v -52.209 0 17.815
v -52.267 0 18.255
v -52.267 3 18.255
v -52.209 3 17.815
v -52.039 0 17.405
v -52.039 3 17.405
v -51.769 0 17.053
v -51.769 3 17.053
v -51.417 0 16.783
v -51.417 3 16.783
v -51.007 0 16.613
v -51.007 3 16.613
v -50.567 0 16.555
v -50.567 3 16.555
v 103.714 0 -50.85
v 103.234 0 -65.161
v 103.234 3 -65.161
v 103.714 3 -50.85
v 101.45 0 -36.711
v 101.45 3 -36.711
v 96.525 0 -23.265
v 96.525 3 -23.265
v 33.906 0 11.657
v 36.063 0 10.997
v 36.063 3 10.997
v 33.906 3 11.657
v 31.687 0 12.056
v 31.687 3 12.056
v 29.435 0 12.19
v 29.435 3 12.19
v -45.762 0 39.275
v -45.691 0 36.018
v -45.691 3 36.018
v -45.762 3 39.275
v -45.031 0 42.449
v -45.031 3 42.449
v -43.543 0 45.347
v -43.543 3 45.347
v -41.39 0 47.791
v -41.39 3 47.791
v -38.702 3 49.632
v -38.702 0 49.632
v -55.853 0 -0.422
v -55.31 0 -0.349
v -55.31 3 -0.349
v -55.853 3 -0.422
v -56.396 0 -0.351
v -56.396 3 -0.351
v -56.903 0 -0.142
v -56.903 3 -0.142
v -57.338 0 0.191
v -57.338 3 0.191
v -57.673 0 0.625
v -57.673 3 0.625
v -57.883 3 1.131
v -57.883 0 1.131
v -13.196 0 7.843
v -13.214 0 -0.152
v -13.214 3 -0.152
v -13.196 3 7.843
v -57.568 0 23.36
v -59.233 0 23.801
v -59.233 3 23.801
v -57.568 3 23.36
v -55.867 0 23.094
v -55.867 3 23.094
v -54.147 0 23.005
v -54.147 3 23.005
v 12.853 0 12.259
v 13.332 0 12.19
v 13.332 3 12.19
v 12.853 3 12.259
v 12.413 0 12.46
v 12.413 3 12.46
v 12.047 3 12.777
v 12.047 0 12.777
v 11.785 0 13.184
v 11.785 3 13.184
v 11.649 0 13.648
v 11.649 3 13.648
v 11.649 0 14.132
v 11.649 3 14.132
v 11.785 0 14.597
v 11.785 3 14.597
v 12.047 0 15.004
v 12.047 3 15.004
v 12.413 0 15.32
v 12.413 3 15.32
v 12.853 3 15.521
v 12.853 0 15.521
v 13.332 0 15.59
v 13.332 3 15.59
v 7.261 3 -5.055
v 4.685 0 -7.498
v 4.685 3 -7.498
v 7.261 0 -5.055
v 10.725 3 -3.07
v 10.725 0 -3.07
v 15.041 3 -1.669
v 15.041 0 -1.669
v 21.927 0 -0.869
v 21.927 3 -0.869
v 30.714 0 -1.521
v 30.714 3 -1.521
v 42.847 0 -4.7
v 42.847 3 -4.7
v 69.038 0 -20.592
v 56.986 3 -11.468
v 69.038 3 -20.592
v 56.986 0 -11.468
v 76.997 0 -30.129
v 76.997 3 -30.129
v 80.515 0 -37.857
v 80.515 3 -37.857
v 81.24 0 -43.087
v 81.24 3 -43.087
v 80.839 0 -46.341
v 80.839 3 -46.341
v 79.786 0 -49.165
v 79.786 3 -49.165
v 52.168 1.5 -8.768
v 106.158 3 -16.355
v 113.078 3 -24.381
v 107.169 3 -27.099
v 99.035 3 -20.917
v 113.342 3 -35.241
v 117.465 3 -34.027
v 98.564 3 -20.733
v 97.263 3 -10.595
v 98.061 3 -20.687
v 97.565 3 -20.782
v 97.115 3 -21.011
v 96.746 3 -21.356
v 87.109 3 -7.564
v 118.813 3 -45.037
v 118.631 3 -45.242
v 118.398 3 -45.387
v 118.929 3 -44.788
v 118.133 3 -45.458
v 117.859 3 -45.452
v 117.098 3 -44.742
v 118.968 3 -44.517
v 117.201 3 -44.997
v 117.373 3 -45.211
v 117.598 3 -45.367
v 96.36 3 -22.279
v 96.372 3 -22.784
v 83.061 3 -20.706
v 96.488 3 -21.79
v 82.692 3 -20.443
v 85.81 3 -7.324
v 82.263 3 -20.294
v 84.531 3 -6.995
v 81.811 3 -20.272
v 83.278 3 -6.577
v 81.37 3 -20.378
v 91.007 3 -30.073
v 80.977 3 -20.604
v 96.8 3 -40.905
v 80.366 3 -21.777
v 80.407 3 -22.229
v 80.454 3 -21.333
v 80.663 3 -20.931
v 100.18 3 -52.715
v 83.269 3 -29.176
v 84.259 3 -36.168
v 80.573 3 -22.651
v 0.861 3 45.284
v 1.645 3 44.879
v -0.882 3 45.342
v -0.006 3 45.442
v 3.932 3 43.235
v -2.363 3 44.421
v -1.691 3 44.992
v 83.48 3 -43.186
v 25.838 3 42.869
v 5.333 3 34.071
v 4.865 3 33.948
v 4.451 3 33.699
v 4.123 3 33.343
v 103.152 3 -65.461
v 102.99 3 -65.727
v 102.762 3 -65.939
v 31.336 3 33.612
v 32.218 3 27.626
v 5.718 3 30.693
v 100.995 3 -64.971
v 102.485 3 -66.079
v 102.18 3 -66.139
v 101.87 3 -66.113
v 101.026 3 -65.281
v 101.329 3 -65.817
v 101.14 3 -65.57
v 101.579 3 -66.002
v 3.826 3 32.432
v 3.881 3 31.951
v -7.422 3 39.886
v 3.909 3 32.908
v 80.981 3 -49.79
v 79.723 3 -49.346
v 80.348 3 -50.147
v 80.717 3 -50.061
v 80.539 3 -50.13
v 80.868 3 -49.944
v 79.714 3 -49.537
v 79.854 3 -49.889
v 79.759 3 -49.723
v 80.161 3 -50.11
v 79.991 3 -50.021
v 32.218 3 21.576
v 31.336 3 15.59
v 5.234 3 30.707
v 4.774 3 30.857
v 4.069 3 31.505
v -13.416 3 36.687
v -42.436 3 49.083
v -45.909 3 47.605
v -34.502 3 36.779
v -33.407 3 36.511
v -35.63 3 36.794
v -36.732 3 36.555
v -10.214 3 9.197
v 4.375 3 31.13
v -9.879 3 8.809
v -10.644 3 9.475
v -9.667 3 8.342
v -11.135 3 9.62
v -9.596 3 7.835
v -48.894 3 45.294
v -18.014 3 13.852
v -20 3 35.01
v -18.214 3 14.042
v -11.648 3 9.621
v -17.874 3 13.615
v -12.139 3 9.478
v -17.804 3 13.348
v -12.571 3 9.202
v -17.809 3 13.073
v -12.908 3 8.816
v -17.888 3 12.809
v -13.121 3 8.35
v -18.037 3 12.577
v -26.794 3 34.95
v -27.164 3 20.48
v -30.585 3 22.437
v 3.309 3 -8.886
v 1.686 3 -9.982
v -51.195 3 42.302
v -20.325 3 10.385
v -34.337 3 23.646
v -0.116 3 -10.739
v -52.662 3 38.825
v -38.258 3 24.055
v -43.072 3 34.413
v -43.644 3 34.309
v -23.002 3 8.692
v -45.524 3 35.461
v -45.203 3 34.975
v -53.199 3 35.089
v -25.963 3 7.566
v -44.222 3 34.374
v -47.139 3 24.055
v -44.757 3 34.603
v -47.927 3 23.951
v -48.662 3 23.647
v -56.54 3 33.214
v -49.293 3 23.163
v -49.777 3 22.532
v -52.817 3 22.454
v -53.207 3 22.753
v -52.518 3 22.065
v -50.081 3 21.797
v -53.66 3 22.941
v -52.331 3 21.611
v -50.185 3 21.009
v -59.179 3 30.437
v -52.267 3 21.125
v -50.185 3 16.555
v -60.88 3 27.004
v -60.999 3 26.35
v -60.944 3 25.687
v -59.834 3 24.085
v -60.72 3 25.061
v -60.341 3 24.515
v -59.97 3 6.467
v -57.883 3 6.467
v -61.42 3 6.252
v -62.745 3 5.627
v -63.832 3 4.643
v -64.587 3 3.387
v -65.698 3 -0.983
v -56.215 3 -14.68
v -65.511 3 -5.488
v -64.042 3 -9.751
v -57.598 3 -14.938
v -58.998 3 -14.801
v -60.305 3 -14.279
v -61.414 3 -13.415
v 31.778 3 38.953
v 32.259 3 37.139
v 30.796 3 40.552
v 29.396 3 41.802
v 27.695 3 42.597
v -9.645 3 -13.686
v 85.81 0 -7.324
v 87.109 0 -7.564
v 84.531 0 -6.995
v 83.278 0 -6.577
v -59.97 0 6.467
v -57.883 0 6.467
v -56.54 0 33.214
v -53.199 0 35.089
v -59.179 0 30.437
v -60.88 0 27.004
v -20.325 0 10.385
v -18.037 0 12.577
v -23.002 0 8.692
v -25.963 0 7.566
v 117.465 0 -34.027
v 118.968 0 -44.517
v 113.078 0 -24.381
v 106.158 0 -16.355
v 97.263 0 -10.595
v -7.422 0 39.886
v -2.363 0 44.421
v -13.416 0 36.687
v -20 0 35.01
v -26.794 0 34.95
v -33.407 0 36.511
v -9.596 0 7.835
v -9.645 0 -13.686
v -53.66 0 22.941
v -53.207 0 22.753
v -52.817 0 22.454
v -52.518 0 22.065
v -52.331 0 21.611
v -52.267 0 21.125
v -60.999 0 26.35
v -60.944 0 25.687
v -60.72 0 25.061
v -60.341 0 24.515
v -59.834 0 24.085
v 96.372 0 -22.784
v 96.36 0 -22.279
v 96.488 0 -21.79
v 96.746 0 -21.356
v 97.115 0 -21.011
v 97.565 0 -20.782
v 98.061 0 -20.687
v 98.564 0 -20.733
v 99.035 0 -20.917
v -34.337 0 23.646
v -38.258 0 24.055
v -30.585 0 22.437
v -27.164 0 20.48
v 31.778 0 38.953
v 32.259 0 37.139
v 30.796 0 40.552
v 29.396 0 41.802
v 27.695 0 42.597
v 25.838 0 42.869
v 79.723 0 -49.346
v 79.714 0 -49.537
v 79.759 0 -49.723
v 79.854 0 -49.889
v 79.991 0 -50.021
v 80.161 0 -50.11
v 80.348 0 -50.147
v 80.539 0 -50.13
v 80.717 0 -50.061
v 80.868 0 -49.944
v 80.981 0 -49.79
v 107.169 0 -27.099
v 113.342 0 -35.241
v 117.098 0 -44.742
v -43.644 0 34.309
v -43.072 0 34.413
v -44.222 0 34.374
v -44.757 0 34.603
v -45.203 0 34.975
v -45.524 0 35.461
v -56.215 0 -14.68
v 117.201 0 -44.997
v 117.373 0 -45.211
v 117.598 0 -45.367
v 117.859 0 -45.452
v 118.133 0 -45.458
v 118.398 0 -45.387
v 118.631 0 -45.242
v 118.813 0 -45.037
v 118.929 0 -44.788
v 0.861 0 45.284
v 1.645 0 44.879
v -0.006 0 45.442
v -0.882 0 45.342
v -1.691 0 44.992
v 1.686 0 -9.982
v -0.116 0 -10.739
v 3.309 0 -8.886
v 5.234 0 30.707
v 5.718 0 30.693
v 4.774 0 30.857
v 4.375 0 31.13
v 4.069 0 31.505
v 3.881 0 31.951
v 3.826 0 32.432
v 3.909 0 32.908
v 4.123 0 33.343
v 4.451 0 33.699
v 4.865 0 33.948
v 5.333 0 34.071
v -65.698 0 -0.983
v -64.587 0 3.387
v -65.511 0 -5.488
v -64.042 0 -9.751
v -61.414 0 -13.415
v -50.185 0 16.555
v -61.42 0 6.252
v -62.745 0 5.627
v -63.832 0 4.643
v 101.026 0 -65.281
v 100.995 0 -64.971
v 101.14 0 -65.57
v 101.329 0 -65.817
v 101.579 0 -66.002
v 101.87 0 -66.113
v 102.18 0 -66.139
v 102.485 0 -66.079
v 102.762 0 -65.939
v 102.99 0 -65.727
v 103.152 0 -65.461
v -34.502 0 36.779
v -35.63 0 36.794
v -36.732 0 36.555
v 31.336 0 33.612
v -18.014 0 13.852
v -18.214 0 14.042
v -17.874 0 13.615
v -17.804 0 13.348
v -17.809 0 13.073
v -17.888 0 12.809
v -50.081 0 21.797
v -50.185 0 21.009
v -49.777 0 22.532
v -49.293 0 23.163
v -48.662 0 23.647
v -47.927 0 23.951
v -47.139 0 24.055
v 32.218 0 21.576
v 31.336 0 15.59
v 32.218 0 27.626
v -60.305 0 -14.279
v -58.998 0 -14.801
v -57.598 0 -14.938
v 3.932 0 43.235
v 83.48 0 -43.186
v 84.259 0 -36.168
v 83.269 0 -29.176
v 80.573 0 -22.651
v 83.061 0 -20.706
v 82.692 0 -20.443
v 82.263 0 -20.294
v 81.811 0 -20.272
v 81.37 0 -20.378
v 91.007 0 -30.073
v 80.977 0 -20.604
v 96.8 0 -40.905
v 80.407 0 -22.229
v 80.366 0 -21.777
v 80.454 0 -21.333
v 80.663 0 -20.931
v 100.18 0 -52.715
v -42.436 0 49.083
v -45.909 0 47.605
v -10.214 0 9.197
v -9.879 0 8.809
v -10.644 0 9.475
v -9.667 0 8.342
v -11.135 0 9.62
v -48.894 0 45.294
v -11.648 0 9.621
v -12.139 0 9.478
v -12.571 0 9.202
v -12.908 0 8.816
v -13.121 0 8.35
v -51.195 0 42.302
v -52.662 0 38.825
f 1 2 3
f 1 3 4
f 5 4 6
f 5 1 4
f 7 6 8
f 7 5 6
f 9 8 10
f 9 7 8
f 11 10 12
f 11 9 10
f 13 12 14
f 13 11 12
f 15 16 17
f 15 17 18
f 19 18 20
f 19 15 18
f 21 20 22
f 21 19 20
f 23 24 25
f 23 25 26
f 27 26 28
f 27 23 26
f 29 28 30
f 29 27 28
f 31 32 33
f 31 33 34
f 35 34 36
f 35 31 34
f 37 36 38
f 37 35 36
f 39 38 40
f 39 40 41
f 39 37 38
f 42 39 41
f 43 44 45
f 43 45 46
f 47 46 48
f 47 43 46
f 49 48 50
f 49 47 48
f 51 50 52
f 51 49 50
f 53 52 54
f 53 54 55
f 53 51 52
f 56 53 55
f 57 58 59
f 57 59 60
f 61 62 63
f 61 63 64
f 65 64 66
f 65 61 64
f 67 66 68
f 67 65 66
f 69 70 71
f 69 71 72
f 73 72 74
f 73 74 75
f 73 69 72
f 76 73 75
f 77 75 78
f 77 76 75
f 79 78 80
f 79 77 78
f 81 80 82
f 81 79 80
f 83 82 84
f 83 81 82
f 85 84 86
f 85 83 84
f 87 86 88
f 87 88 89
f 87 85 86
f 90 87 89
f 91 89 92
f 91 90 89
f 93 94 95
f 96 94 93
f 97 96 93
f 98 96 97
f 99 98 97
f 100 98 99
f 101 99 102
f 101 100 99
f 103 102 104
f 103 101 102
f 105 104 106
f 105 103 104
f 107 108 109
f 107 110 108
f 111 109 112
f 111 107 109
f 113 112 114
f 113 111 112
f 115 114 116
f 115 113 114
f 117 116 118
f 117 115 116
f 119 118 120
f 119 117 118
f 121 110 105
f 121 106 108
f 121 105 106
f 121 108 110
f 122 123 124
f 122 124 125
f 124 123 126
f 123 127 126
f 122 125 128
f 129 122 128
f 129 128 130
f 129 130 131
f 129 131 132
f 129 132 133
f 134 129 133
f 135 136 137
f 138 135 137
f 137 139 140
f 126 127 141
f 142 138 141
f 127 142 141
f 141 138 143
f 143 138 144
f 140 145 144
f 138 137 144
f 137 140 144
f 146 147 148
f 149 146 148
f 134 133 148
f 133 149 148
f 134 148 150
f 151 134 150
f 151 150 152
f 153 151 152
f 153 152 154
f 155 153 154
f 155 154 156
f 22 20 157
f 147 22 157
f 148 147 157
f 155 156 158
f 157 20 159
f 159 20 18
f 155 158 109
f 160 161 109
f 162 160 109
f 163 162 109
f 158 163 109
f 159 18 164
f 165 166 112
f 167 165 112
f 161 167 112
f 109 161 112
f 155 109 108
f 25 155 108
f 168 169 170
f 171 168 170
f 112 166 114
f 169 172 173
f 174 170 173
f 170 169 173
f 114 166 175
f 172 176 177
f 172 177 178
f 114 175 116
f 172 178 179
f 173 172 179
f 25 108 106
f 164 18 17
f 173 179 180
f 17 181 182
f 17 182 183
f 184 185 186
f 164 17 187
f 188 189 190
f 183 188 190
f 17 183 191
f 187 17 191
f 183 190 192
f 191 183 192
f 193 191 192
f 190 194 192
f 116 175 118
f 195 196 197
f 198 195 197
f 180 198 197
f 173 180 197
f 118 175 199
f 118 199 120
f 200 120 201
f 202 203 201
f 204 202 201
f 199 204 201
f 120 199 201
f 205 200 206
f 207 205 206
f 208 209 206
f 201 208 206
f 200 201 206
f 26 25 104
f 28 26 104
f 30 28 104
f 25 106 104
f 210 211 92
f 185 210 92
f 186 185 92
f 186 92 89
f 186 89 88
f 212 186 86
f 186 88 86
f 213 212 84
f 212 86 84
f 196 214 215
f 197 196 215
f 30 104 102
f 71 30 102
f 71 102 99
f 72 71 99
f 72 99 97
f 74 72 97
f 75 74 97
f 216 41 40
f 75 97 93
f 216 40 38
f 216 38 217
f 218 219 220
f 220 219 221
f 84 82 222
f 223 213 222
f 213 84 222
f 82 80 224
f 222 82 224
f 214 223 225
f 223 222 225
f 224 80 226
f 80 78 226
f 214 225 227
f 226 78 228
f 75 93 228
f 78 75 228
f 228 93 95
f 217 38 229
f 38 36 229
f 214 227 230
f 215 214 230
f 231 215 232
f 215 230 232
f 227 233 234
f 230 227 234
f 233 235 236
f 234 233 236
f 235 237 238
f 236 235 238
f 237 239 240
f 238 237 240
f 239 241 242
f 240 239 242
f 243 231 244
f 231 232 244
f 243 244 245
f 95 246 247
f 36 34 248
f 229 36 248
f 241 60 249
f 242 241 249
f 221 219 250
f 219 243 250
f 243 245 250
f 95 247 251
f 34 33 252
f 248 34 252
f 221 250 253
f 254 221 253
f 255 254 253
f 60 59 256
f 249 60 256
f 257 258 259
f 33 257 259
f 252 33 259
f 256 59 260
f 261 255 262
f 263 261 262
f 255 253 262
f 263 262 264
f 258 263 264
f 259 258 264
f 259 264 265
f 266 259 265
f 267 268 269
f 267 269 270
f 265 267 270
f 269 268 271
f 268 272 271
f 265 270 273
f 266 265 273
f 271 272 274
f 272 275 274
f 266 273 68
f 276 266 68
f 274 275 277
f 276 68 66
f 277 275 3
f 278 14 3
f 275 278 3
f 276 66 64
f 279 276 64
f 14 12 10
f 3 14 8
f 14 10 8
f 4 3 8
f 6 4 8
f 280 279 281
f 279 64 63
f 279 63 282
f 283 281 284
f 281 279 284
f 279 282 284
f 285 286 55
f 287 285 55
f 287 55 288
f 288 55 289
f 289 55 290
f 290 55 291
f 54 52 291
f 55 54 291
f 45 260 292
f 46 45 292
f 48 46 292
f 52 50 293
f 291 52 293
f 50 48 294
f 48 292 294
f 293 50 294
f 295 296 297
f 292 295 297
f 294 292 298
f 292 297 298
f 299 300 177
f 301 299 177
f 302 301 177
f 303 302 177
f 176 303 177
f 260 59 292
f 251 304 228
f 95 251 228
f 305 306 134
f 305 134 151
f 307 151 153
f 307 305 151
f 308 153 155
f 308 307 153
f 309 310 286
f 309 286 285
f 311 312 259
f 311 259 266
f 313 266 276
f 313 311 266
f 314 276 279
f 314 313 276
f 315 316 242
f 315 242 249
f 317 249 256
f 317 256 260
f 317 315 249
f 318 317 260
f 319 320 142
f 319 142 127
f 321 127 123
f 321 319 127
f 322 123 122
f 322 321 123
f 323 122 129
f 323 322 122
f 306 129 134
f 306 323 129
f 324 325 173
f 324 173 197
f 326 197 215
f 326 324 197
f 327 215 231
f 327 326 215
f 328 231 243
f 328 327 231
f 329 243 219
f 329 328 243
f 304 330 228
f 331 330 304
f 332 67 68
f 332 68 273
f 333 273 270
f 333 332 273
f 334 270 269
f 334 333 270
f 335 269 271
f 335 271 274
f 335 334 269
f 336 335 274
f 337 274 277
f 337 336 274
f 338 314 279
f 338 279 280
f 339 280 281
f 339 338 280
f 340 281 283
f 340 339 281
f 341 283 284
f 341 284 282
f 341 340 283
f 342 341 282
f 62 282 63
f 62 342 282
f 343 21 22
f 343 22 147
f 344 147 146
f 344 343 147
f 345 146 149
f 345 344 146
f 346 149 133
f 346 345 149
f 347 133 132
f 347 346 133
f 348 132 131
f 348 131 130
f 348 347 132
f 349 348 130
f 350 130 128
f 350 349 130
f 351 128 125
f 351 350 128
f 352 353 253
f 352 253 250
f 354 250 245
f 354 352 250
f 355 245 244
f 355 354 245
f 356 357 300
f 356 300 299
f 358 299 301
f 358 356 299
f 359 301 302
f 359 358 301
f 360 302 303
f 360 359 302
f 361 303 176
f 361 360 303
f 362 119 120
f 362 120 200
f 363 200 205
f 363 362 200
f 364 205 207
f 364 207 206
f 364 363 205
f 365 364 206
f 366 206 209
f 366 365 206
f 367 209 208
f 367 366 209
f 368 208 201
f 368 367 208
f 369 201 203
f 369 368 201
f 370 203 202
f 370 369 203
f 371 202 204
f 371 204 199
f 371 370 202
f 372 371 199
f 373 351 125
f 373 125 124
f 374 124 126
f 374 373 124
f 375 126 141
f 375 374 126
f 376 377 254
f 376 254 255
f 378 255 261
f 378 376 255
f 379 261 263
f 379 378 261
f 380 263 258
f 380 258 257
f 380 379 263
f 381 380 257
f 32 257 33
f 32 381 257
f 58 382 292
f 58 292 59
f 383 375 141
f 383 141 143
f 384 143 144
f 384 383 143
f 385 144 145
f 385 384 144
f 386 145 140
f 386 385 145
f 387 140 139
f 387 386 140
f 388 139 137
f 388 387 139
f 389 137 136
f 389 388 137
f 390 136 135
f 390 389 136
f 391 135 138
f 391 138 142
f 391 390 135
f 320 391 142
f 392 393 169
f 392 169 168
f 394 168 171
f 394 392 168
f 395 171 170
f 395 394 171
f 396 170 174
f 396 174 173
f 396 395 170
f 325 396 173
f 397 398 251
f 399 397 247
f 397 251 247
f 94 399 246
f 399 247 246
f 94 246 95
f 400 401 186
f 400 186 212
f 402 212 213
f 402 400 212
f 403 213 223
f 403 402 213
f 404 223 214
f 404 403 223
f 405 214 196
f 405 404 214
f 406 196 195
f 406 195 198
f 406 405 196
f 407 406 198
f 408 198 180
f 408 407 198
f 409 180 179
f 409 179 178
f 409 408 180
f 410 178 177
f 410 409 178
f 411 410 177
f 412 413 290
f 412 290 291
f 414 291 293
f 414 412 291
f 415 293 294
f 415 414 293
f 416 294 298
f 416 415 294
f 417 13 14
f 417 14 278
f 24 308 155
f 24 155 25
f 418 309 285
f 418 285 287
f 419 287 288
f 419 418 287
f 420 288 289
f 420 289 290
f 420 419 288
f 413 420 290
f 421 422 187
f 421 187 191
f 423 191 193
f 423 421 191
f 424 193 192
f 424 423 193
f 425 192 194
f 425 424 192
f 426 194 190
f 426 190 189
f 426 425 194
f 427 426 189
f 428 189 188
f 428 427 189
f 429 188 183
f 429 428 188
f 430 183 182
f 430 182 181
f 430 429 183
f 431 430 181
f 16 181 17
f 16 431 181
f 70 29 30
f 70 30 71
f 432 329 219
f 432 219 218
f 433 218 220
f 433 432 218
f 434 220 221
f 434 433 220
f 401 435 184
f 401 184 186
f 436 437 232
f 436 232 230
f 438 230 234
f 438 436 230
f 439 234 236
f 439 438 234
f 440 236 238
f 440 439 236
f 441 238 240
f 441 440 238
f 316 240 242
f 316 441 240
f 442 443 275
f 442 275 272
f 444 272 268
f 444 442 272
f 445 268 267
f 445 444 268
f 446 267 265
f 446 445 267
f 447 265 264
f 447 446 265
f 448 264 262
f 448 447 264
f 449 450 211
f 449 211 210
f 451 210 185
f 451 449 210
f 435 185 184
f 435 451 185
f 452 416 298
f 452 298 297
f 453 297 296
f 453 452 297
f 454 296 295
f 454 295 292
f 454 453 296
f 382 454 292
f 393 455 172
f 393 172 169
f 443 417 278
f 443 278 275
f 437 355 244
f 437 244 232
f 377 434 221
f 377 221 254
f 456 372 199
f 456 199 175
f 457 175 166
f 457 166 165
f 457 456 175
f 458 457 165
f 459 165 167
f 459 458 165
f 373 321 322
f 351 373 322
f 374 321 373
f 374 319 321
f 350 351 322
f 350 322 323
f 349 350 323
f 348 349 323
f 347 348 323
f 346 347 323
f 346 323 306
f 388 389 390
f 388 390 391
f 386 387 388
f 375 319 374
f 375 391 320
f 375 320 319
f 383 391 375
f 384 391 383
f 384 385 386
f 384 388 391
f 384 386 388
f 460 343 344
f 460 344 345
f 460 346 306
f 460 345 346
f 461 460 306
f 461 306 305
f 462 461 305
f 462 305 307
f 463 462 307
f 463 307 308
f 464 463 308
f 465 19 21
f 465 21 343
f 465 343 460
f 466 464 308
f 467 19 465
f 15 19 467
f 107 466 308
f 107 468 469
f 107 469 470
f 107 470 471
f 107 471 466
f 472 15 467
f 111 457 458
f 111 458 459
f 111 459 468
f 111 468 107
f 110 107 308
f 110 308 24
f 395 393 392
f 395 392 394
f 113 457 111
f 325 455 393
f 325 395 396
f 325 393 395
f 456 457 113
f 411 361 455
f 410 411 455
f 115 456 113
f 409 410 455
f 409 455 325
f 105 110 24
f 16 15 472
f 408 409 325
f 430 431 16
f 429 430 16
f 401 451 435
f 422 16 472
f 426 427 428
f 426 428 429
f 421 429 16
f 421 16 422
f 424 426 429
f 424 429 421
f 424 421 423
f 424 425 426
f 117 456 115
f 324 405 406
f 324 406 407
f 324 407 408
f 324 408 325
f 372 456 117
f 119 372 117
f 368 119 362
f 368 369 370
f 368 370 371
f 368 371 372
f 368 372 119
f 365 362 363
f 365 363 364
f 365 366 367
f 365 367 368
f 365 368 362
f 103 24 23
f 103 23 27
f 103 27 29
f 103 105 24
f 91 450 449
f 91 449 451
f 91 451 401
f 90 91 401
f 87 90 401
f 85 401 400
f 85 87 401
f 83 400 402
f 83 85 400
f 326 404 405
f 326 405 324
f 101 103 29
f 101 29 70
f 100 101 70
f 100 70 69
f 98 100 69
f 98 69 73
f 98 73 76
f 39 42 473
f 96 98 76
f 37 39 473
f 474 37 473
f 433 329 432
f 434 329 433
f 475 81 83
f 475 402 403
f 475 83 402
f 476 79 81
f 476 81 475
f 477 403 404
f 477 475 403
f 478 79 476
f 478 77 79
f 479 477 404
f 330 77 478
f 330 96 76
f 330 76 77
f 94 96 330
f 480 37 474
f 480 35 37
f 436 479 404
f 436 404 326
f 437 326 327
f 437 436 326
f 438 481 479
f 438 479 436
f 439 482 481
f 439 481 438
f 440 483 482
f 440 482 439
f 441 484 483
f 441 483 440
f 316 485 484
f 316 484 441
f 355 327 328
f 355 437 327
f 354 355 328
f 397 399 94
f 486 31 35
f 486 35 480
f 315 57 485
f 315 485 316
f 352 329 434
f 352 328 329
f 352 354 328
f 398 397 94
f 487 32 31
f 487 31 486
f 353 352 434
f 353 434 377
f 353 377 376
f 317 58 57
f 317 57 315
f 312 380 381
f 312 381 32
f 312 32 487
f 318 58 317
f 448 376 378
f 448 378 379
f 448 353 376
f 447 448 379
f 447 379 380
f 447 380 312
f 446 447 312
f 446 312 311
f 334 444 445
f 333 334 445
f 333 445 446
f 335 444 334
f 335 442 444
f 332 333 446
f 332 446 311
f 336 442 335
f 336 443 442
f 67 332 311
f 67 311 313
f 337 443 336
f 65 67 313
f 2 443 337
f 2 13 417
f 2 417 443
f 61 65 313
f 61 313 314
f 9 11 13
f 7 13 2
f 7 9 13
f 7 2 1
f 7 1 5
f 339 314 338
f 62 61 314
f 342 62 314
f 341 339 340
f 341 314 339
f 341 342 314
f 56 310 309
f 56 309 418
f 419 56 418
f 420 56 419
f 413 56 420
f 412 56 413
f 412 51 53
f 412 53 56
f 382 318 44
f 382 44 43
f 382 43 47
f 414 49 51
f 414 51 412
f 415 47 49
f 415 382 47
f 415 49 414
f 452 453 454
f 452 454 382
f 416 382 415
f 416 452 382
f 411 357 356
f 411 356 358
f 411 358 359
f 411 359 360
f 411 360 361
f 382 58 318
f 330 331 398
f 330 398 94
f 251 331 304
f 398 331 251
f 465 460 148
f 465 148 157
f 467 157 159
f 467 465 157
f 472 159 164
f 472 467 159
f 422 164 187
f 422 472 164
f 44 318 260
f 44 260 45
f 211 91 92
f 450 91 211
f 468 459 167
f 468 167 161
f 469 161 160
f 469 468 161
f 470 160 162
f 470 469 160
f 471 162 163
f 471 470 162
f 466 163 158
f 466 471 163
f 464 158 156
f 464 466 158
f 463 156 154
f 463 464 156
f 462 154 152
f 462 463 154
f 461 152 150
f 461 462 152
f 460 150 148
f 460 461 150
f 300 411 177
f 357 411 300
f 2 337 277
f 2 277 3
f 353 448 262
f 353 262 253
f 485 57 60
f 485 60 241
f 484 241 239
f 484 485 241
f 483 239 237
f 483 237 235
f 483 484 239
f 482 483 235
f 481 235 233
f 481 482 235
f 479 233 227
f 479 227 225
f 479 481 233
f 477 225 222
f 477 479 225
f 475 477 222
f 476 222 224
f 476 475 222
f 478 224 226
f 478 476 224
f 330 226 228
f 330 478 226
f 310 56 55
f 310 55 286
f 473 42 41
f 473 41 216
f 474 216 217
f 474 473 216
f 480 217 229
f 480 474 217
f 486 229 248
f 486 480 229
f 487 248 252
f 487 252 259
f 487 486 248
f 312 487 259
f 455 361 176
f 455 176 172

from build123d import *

# Parameters (mm, degrees)
BOSS_EXTRUDE2_DEPTH = 3
FILLET1_R           = 10


with BuildPart() as part:
    # Sketch1 → Boss-Extrude2 (new body)
    with BuildSketch(Plane(origin=(0, 0, 0), x_dir=(1, 0, 0), z_dir=(0, 1, 0))):
        with BuildLine():
            Line((83.277636848, 6.577391731), (36.063202158, -10.996818305))
            ThreePointArc((36.063202158, -10.996818305), (32.802532832, -11.889585683), (29.435258028, -12.19034879))
            Line((29.435258028, -12.19034879), (13.331621464, -12.19034879))
            ThreePointArc((13.331621464, -12.19034879), (11.631621464, -13.89034879), (13.331621464, -15.59034879))
            Line((13.331621464, -15.59034879), (31.335553361, -15.59034879))
            ThreePointArc((31.335553361, -15.59034879), (32.329091164, -24.600925987), (31.335553361, -33.611503185))
            Line((31.335553361, -33.611503185), (5.718159441, -30.692769825))
            ThreePointArc((5.718159441, -30.692769825), (3.836641823, -32.189396516), (5.333268515, -34.070914135))
            Line((5.333268515, -34.070914135), (32.258758745, -37.138686243))
            ThreePointArc((32.258758745, -37.138686243), (30.141236011, -41.228168064), (25.83833159, -42.869136571))
            Line((25.83833159, -42.869136571), (3.931607644, -43.234741077))
            Line((3.931607644, -43.234741077), (1.645004408, -44.879459267))
            ThreePointArc((1.645004408, -44.879459267), (-0.44755249, -45.424610965), (-2.363050322, -44.421190413))
            ThreePointArc((-2.363050322, -44.421190413), (-16.657617756, -35.649988568), (-33.406545395, -36.511419261))
            ThreePointArc((-33.406545395, -36.511419261), (-35.065515769, -36.818007167), (-36.732015424, -36.555409102))
            Line((-36.732015424, -36.555409102), (-43.072013441, -34.41346595))
            ThreePointArc((-43.072013441, -34.41346595), (-44.756883472, -34.602804193), (-45.690953078, -36.017777677))
            ThreePointArc((-45.690953078, -36.017777677), (-44.377060251, -43.944176391), (-38.701961301, -49.631650596))
            ThreePointArc((-38.701961301, -49.631650596), (-48.89375638, -45.294039559), (-53.199015105, -35.088535957))
            ThreePointArc((-53.199015105, -35.088535957), (-57.963880411, -31.924307539), (-60.880420097, -27.003933658))
            ThreePointArc((-60.880420097, -27.003933658), (-60.719986784, -25.061085947), (-59.232742508, -23.80072864))
            ThreePointArc((-59.232742508, -23.80072864), (-56.720776297, -23.205324241), (-54.14697512, -23.005253893))
            ThreePointArc((-54.14697512, -23.005253893), (-52.817288904, -22.454479829), (-52.26651484, -21.124793613))
            Line((-52.26651484, -21.124793613), (-52.26651484, -18.255253893))
            ThreePointArc((-52.26651484, -18.255253893), (-51.768596368, -17.053172365), (-50.56651484, -16.555253893))
            Line((-50.56651484, -16.555253893), (-50.18504008, -16.555253893))
            Line((-50.18504008, -16.555253893), (-50.18504008, -21.008976099))
            ThreePointArc((-50.18504008, -21.008976099), (-49.292805972, -23.163019785), (-47.138762286, -24.055253893))
            Line((-47.138762286, -24.055253893), (-38.258057554, -24.055253893))
            ThreePointArc((-38.258057554, -24.055253893), (-32.429820226, -23.139270307), (-27.163537606, -20.479638066))
            Line((-27.163537606, -20.479638066), (-18.213895237, -14.042299326))
            ThreePointArc((-18.213895237, -14.042299326), (-17.803794916, -13.348327859), (-18.036830501, -12.576658832))
            ThreePointArc((-18.036830501, -12.576658832), (-21.621060958, -9.471725354), (-25.963310125, -7.565894288))
            Line((-25.963310125, -7.565894288), (-55.30954126, 0.349304832))
            ThreePointArc((-55.30954126, 0.349304832), (-56.903028243, 0.142191478), (-57.883342437, -1.131025232))
            Line((-57.883342437, -1.131025232), (-57.883342437, -6.467193959))
            Line((-57.883342437, -6.467193959), (-59.970418868, -6.467193959))
            ThreePointArc((-59.970418868, -6.467193959), (-62.745333472, -5.626502668), (-64.58710946, -3.387133535))
            ThreePointArc((-64.58710946, -3.387133535), (-65.510981808, 5.487804074), (-61.413967112, 13.414501258))
            ThreePointArc((-61.413967112, 13.414501258), (-58.998069827, 14.801189981), (-56.215124926, 14.680016601))
            Line((-56.215124926, 14.680016601), (-13.213967112, 0.152246204))
            Line((-13.213967112, 0.152246204), (-13.195522989, -7.843254171))
            ThreePointArc((-13.195522989, -7.843254171), (-11.391375526, -9.63909713), (-9.595532567, -7.834949667))
            Line((-9.595532567, -7.834949667), (-9.645178165, 13.686344484))
            Line((-9.645178165, 13.686344484), (3.240530108, 9.701083124))
            add(Edge.make_bspline(
                [(3.240530108, 9.701083124), (13.894797432, -10.964082924), (52.167573777, 8.768078407), (90.440350123, 28.500239738), (79.7860828, 49.165405786)],
                knots=[0, 0, 0, 1.570796327, 1.570796327, 3.141592654, 3.141592654, 3.141592654], degree=2, weights=[1, 0.707106781, 1, 0.707106781, 1]))
            ThreePointArc((79.7860828, 49.165405786), (80.072864648, 50.071466121), (80.980537261, 49.789828788))
            ThreePointArc((80.980537261, 49.789828788), (84.258913327, 36.167877688), (80.573020022, 22.650500281))
            ThreePointArc((80.573020022, 22.650500281), (80.977131886, 20.603840239), (83.060820169, 20.705658035))
            ThreePointArc((83.060820169, 20.705658035), (96.799731472, 40.905147255), (100.995247842, 64.971195766))
            ThreePointArc((100.995247842, 64.971195766), (102.023911204, 66.136579392), (103.234366802, 65.161354006))
            ThreePointArc((103.234366802, 65.161354006), (102.922479327, 43.72601882), (96.524889391, 23.265282974))
            ThreePointArc((96.524889391, 23.265282974), (96.918331366, 21.170533694), (99.034577715, 20.917013432))
            ThreePointArc((99.034577715, 20.917013432), (110.533106389, 30.95950626), (117.098161764, 44.742389549))
            ThreePointArc((117.098161764, 44.742389549), (118.133339849, 45.458434414), (118.968319872, 44.516562727))
            ThreePointArc((118.968319872, 44.516562727), (109.903683893, 20.121141501), (87.108506166, 7.563909538))
            ThreePointArc((87.108506166, 7.563909538), (85.167327095, 7.170621945), (83.277636848, 6.577391731))
        make_face()
    extrude(amount=BOSS_EXTRUDE2_DEPTH)

    # Fillet1
    fillet1_edges = [part.edges().sort_by_distance(p)[0] for p in [
        (3.240530108, 1.5, -9.701083124),
    ]]
    fillet(fillet1_edges, radius=FILLET1_R)


solid = part.part
